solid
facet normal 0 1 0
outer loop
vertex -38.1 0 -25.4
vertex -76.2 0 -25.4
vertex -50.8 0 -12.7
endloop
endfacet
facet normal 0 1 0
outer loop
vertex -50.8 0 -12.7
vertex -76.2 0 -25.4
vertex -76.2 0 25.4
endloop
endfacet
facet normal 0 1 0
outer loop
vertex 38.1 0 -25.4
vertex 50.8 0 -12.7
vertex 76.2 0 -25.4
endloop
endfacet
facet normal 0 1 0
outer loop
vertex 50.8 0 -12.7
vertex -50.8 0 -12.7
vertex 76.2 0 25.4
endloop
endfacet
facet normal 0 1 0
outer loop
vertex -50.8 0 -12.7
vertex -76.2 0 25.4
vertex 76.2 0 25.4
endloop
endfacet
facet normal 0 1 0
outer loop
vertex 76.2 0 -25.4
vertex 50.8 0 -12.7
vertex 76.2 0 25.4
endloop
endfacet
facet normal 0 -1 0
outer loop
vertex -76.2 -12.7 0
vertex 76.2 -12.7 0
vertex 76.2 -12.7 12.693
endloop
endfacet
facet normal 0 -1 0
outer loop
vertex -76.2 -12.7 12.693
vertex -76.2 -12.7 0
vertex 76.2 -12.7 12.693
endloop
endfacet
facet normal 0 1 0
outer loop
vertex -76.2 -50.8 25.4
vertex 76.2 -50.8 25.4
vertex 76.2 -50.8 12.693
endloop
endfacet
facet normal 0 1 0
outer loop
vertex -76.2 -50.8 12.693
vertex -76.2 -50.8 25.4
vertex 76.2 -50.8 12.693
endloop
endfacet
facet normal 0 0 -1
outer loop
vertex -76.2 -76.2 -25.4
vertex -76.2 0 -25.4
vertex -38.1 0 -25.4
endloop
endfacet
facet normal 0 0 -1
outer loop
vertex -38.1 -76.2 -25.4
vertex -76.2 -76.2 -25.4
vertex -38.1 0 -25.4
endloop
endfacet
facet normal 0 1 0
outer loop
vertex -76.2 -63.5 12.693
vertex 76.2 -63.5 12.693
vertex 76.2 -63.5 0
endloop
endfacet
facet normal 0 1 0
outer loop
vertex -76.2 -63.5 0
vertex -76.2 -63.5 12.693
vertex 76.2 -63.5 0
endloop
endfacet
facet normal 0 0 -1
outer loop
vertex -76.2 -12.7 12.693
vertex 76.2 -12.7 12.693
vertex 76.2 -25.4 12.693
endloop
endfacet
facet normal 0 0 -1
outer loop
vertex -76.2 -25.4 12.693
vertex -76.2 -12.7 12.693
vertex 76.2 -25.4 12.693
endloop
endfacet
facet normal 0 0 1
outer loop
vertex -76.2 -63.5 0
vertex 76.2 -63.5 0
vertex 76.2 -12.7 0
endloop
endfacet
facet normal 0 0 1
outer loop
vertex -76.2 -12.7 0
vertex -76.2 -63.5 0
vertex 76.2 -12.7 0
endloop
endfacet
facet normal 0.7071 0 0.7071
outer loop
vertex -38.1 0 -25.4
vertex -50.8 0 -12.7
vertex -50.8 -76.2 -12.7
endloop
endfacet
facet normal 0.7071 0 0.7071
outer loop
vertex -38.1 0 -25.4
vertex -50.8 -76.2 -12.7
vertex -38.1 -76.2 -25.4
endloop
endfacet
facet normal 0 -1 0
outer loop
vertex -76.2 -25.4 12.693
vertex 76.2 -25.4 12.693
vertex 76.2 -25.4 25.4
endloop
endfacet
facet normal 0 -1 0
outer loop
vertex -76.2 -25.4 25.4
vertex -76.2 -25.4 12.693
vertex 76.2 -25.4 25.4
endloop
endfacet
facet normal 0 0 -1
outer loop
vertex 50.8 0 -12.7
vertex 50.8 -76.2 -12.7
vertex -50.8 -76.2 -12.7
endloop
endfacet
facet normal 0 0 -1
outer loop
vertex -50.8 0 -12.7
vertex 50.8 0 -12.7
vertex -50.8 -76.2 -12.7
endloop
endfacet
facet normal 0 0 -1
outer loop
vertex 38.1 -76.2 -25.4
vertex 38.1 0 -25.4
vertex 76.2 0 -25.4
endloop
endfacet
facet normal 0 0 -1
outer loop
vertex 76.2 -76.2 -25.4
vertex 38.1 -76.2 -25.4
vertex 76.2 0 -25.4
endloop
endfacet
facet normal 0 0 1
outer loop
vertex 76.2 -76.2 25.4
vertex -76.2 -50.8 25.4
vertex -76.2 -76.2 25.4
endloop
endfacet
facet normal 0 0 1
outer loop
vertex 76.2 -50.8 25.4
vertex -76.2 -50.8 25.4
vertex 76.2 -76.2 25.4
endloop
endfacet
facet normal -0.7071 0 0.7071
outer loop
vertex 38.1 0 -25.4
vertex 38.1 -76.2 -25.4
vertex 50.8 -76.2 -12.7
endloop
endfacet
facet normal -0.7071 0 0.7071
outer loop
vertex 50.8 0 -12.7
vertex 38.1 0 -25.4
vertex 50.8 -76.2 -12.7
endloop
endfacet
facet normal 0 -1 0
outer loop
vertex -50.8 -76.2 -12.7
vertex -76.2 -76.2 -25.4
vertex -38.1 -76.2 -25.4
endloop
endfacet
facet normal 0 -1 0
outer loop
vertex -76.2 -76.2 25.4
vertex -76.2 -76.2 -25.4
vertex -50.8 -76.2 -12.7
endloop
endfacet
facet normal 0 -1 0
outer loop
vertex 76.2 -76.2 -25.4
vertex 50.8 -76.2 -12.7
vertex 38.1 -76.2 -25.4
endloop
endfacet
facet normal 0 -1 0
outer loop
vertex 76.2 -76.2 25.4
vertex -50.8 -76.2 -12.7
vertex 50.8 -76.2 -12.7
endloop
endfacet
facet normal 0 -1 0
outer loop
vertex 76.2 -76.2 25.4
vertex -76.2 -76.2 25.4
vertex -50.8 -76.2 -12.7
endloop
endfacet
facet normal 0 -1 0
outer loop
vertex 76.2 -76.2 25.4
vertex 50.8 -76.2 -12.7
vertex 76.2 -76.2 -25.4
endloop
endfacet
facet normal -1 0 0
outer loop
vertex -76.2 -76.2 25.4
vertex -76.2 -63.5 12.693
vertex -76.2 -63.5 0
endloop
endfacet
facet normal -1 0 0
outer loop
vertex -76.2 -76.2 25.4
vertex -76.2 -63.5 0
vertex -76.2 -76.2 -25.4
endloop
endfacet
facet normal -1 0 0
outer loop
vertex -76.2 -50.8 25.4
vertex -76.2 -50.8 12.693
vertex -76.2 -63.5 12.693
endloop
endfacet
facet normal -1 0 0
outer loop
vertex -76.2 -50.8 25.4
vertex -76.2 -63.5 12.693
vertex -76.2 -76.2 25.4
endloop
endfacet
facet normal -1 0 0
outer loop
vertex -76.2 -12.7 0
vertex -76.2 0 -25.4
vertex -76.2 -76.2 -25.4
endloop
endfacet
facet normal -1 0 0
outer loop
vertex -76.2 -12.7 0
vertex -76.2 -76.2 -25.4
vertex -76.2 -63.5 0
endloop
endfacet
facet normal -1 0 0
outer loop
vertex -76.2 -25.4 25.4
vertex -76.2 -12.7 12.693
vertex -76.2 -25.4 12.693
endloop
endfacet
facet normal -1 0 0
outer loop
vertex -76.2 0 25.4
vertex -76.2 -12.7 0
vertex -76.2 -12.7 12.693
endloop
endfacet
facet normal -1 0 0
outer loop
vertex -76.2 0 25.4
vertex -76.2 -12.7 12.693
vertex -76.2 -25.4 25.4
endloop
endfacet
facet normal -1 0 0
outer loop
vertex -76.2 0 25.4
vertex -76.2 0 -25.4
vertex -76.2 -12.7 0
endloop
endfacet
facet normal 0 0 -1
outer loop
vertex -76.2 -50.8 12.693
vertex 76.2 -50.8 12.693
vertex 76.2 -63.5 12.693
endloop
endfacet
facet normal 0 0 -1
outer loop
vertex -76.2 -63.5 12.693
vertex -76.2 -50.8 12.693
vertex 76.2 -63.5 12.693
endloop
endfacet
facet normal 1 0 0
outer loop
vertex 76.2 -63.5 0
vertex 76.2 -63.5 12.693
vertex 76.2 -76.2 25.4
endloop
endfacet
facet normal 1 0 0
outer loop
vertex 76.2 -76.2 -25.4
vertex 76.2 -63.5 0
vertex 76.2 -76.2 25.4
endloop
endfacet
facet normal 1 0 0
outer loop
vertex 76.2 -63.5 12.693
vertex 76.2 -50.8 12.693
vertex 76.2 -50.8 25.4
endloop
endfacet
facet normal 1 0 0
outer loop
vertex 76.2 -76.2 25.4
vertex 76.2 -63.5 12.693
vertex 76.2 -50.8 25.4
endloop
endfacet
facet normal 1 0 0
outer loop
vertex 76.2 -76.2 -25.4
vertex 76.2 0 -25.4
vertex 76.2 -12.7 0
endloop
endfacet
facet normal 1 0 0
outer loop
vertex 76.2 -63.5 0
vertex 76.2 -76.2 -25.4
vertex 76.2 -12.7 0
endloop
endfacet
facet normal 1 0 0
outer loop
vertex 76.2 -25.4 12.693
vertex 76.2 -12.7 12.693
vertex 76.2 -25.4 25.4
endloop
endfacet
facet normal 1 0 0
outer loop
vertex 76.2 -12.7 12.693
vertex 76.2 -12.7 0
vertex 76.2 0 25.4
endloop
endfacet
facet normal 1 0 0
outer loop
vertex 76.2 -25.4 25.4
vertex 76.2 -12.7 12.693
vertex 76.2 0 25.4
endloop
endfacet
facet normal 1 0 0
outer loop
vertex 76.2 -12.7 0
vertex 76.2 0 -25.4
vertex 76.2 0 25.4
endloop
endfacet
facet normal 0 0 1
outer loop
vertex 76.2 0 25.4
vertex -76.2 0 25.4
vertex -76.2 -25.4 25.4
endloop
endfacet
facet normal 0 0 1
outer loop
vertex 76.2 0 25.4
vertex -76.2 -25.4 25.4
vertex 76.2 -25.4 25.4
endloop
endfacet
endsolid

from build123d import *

# Parameters (mm, degrees)
F0_W     = 152.4
F0_H     = 50.8
F1_DEPTH = 76.2
F3_DEPTH = 152.401
F5_DEPTH = 76.201


with BuildPart() as f1:
    # F0 (on Front) → F1 (new body)
    with BuildSketch(Plane.XZ):
        Rectangle(F0_W, F0_H)
    extrude(amount=F1_DEPTH)

    # F2 (on face) → F3 (cut, through all)
    with BuildSketch(Plane.YZ.offset(76.2)):
        Polygon((-25.4, 12.693209), (-25.4, 25.4), (-50.8, 25.4), (-50.8, 12.693209), (-63.5, 12.693209), (-63.5, 0), (-12.7, 0), (-12.7, 12.693209), align=None)
    extrude(amount=-F3_DEPTH, mode=Mode.SUBTRACT)

    # F4 (on face) → F5 (cut, through all)
    with BuildSketch(Plane.XZ.offset(76.2)):
        Polygon((50.8, -12.7), (0, -12.7), (-50.8, -12.7), (-38.1, -25.4), (38.1, -25.4), align=None)
    extrude(amount=-F5_DEPTH, mode=Mode.SUBTRACT)


solid = f1.part
